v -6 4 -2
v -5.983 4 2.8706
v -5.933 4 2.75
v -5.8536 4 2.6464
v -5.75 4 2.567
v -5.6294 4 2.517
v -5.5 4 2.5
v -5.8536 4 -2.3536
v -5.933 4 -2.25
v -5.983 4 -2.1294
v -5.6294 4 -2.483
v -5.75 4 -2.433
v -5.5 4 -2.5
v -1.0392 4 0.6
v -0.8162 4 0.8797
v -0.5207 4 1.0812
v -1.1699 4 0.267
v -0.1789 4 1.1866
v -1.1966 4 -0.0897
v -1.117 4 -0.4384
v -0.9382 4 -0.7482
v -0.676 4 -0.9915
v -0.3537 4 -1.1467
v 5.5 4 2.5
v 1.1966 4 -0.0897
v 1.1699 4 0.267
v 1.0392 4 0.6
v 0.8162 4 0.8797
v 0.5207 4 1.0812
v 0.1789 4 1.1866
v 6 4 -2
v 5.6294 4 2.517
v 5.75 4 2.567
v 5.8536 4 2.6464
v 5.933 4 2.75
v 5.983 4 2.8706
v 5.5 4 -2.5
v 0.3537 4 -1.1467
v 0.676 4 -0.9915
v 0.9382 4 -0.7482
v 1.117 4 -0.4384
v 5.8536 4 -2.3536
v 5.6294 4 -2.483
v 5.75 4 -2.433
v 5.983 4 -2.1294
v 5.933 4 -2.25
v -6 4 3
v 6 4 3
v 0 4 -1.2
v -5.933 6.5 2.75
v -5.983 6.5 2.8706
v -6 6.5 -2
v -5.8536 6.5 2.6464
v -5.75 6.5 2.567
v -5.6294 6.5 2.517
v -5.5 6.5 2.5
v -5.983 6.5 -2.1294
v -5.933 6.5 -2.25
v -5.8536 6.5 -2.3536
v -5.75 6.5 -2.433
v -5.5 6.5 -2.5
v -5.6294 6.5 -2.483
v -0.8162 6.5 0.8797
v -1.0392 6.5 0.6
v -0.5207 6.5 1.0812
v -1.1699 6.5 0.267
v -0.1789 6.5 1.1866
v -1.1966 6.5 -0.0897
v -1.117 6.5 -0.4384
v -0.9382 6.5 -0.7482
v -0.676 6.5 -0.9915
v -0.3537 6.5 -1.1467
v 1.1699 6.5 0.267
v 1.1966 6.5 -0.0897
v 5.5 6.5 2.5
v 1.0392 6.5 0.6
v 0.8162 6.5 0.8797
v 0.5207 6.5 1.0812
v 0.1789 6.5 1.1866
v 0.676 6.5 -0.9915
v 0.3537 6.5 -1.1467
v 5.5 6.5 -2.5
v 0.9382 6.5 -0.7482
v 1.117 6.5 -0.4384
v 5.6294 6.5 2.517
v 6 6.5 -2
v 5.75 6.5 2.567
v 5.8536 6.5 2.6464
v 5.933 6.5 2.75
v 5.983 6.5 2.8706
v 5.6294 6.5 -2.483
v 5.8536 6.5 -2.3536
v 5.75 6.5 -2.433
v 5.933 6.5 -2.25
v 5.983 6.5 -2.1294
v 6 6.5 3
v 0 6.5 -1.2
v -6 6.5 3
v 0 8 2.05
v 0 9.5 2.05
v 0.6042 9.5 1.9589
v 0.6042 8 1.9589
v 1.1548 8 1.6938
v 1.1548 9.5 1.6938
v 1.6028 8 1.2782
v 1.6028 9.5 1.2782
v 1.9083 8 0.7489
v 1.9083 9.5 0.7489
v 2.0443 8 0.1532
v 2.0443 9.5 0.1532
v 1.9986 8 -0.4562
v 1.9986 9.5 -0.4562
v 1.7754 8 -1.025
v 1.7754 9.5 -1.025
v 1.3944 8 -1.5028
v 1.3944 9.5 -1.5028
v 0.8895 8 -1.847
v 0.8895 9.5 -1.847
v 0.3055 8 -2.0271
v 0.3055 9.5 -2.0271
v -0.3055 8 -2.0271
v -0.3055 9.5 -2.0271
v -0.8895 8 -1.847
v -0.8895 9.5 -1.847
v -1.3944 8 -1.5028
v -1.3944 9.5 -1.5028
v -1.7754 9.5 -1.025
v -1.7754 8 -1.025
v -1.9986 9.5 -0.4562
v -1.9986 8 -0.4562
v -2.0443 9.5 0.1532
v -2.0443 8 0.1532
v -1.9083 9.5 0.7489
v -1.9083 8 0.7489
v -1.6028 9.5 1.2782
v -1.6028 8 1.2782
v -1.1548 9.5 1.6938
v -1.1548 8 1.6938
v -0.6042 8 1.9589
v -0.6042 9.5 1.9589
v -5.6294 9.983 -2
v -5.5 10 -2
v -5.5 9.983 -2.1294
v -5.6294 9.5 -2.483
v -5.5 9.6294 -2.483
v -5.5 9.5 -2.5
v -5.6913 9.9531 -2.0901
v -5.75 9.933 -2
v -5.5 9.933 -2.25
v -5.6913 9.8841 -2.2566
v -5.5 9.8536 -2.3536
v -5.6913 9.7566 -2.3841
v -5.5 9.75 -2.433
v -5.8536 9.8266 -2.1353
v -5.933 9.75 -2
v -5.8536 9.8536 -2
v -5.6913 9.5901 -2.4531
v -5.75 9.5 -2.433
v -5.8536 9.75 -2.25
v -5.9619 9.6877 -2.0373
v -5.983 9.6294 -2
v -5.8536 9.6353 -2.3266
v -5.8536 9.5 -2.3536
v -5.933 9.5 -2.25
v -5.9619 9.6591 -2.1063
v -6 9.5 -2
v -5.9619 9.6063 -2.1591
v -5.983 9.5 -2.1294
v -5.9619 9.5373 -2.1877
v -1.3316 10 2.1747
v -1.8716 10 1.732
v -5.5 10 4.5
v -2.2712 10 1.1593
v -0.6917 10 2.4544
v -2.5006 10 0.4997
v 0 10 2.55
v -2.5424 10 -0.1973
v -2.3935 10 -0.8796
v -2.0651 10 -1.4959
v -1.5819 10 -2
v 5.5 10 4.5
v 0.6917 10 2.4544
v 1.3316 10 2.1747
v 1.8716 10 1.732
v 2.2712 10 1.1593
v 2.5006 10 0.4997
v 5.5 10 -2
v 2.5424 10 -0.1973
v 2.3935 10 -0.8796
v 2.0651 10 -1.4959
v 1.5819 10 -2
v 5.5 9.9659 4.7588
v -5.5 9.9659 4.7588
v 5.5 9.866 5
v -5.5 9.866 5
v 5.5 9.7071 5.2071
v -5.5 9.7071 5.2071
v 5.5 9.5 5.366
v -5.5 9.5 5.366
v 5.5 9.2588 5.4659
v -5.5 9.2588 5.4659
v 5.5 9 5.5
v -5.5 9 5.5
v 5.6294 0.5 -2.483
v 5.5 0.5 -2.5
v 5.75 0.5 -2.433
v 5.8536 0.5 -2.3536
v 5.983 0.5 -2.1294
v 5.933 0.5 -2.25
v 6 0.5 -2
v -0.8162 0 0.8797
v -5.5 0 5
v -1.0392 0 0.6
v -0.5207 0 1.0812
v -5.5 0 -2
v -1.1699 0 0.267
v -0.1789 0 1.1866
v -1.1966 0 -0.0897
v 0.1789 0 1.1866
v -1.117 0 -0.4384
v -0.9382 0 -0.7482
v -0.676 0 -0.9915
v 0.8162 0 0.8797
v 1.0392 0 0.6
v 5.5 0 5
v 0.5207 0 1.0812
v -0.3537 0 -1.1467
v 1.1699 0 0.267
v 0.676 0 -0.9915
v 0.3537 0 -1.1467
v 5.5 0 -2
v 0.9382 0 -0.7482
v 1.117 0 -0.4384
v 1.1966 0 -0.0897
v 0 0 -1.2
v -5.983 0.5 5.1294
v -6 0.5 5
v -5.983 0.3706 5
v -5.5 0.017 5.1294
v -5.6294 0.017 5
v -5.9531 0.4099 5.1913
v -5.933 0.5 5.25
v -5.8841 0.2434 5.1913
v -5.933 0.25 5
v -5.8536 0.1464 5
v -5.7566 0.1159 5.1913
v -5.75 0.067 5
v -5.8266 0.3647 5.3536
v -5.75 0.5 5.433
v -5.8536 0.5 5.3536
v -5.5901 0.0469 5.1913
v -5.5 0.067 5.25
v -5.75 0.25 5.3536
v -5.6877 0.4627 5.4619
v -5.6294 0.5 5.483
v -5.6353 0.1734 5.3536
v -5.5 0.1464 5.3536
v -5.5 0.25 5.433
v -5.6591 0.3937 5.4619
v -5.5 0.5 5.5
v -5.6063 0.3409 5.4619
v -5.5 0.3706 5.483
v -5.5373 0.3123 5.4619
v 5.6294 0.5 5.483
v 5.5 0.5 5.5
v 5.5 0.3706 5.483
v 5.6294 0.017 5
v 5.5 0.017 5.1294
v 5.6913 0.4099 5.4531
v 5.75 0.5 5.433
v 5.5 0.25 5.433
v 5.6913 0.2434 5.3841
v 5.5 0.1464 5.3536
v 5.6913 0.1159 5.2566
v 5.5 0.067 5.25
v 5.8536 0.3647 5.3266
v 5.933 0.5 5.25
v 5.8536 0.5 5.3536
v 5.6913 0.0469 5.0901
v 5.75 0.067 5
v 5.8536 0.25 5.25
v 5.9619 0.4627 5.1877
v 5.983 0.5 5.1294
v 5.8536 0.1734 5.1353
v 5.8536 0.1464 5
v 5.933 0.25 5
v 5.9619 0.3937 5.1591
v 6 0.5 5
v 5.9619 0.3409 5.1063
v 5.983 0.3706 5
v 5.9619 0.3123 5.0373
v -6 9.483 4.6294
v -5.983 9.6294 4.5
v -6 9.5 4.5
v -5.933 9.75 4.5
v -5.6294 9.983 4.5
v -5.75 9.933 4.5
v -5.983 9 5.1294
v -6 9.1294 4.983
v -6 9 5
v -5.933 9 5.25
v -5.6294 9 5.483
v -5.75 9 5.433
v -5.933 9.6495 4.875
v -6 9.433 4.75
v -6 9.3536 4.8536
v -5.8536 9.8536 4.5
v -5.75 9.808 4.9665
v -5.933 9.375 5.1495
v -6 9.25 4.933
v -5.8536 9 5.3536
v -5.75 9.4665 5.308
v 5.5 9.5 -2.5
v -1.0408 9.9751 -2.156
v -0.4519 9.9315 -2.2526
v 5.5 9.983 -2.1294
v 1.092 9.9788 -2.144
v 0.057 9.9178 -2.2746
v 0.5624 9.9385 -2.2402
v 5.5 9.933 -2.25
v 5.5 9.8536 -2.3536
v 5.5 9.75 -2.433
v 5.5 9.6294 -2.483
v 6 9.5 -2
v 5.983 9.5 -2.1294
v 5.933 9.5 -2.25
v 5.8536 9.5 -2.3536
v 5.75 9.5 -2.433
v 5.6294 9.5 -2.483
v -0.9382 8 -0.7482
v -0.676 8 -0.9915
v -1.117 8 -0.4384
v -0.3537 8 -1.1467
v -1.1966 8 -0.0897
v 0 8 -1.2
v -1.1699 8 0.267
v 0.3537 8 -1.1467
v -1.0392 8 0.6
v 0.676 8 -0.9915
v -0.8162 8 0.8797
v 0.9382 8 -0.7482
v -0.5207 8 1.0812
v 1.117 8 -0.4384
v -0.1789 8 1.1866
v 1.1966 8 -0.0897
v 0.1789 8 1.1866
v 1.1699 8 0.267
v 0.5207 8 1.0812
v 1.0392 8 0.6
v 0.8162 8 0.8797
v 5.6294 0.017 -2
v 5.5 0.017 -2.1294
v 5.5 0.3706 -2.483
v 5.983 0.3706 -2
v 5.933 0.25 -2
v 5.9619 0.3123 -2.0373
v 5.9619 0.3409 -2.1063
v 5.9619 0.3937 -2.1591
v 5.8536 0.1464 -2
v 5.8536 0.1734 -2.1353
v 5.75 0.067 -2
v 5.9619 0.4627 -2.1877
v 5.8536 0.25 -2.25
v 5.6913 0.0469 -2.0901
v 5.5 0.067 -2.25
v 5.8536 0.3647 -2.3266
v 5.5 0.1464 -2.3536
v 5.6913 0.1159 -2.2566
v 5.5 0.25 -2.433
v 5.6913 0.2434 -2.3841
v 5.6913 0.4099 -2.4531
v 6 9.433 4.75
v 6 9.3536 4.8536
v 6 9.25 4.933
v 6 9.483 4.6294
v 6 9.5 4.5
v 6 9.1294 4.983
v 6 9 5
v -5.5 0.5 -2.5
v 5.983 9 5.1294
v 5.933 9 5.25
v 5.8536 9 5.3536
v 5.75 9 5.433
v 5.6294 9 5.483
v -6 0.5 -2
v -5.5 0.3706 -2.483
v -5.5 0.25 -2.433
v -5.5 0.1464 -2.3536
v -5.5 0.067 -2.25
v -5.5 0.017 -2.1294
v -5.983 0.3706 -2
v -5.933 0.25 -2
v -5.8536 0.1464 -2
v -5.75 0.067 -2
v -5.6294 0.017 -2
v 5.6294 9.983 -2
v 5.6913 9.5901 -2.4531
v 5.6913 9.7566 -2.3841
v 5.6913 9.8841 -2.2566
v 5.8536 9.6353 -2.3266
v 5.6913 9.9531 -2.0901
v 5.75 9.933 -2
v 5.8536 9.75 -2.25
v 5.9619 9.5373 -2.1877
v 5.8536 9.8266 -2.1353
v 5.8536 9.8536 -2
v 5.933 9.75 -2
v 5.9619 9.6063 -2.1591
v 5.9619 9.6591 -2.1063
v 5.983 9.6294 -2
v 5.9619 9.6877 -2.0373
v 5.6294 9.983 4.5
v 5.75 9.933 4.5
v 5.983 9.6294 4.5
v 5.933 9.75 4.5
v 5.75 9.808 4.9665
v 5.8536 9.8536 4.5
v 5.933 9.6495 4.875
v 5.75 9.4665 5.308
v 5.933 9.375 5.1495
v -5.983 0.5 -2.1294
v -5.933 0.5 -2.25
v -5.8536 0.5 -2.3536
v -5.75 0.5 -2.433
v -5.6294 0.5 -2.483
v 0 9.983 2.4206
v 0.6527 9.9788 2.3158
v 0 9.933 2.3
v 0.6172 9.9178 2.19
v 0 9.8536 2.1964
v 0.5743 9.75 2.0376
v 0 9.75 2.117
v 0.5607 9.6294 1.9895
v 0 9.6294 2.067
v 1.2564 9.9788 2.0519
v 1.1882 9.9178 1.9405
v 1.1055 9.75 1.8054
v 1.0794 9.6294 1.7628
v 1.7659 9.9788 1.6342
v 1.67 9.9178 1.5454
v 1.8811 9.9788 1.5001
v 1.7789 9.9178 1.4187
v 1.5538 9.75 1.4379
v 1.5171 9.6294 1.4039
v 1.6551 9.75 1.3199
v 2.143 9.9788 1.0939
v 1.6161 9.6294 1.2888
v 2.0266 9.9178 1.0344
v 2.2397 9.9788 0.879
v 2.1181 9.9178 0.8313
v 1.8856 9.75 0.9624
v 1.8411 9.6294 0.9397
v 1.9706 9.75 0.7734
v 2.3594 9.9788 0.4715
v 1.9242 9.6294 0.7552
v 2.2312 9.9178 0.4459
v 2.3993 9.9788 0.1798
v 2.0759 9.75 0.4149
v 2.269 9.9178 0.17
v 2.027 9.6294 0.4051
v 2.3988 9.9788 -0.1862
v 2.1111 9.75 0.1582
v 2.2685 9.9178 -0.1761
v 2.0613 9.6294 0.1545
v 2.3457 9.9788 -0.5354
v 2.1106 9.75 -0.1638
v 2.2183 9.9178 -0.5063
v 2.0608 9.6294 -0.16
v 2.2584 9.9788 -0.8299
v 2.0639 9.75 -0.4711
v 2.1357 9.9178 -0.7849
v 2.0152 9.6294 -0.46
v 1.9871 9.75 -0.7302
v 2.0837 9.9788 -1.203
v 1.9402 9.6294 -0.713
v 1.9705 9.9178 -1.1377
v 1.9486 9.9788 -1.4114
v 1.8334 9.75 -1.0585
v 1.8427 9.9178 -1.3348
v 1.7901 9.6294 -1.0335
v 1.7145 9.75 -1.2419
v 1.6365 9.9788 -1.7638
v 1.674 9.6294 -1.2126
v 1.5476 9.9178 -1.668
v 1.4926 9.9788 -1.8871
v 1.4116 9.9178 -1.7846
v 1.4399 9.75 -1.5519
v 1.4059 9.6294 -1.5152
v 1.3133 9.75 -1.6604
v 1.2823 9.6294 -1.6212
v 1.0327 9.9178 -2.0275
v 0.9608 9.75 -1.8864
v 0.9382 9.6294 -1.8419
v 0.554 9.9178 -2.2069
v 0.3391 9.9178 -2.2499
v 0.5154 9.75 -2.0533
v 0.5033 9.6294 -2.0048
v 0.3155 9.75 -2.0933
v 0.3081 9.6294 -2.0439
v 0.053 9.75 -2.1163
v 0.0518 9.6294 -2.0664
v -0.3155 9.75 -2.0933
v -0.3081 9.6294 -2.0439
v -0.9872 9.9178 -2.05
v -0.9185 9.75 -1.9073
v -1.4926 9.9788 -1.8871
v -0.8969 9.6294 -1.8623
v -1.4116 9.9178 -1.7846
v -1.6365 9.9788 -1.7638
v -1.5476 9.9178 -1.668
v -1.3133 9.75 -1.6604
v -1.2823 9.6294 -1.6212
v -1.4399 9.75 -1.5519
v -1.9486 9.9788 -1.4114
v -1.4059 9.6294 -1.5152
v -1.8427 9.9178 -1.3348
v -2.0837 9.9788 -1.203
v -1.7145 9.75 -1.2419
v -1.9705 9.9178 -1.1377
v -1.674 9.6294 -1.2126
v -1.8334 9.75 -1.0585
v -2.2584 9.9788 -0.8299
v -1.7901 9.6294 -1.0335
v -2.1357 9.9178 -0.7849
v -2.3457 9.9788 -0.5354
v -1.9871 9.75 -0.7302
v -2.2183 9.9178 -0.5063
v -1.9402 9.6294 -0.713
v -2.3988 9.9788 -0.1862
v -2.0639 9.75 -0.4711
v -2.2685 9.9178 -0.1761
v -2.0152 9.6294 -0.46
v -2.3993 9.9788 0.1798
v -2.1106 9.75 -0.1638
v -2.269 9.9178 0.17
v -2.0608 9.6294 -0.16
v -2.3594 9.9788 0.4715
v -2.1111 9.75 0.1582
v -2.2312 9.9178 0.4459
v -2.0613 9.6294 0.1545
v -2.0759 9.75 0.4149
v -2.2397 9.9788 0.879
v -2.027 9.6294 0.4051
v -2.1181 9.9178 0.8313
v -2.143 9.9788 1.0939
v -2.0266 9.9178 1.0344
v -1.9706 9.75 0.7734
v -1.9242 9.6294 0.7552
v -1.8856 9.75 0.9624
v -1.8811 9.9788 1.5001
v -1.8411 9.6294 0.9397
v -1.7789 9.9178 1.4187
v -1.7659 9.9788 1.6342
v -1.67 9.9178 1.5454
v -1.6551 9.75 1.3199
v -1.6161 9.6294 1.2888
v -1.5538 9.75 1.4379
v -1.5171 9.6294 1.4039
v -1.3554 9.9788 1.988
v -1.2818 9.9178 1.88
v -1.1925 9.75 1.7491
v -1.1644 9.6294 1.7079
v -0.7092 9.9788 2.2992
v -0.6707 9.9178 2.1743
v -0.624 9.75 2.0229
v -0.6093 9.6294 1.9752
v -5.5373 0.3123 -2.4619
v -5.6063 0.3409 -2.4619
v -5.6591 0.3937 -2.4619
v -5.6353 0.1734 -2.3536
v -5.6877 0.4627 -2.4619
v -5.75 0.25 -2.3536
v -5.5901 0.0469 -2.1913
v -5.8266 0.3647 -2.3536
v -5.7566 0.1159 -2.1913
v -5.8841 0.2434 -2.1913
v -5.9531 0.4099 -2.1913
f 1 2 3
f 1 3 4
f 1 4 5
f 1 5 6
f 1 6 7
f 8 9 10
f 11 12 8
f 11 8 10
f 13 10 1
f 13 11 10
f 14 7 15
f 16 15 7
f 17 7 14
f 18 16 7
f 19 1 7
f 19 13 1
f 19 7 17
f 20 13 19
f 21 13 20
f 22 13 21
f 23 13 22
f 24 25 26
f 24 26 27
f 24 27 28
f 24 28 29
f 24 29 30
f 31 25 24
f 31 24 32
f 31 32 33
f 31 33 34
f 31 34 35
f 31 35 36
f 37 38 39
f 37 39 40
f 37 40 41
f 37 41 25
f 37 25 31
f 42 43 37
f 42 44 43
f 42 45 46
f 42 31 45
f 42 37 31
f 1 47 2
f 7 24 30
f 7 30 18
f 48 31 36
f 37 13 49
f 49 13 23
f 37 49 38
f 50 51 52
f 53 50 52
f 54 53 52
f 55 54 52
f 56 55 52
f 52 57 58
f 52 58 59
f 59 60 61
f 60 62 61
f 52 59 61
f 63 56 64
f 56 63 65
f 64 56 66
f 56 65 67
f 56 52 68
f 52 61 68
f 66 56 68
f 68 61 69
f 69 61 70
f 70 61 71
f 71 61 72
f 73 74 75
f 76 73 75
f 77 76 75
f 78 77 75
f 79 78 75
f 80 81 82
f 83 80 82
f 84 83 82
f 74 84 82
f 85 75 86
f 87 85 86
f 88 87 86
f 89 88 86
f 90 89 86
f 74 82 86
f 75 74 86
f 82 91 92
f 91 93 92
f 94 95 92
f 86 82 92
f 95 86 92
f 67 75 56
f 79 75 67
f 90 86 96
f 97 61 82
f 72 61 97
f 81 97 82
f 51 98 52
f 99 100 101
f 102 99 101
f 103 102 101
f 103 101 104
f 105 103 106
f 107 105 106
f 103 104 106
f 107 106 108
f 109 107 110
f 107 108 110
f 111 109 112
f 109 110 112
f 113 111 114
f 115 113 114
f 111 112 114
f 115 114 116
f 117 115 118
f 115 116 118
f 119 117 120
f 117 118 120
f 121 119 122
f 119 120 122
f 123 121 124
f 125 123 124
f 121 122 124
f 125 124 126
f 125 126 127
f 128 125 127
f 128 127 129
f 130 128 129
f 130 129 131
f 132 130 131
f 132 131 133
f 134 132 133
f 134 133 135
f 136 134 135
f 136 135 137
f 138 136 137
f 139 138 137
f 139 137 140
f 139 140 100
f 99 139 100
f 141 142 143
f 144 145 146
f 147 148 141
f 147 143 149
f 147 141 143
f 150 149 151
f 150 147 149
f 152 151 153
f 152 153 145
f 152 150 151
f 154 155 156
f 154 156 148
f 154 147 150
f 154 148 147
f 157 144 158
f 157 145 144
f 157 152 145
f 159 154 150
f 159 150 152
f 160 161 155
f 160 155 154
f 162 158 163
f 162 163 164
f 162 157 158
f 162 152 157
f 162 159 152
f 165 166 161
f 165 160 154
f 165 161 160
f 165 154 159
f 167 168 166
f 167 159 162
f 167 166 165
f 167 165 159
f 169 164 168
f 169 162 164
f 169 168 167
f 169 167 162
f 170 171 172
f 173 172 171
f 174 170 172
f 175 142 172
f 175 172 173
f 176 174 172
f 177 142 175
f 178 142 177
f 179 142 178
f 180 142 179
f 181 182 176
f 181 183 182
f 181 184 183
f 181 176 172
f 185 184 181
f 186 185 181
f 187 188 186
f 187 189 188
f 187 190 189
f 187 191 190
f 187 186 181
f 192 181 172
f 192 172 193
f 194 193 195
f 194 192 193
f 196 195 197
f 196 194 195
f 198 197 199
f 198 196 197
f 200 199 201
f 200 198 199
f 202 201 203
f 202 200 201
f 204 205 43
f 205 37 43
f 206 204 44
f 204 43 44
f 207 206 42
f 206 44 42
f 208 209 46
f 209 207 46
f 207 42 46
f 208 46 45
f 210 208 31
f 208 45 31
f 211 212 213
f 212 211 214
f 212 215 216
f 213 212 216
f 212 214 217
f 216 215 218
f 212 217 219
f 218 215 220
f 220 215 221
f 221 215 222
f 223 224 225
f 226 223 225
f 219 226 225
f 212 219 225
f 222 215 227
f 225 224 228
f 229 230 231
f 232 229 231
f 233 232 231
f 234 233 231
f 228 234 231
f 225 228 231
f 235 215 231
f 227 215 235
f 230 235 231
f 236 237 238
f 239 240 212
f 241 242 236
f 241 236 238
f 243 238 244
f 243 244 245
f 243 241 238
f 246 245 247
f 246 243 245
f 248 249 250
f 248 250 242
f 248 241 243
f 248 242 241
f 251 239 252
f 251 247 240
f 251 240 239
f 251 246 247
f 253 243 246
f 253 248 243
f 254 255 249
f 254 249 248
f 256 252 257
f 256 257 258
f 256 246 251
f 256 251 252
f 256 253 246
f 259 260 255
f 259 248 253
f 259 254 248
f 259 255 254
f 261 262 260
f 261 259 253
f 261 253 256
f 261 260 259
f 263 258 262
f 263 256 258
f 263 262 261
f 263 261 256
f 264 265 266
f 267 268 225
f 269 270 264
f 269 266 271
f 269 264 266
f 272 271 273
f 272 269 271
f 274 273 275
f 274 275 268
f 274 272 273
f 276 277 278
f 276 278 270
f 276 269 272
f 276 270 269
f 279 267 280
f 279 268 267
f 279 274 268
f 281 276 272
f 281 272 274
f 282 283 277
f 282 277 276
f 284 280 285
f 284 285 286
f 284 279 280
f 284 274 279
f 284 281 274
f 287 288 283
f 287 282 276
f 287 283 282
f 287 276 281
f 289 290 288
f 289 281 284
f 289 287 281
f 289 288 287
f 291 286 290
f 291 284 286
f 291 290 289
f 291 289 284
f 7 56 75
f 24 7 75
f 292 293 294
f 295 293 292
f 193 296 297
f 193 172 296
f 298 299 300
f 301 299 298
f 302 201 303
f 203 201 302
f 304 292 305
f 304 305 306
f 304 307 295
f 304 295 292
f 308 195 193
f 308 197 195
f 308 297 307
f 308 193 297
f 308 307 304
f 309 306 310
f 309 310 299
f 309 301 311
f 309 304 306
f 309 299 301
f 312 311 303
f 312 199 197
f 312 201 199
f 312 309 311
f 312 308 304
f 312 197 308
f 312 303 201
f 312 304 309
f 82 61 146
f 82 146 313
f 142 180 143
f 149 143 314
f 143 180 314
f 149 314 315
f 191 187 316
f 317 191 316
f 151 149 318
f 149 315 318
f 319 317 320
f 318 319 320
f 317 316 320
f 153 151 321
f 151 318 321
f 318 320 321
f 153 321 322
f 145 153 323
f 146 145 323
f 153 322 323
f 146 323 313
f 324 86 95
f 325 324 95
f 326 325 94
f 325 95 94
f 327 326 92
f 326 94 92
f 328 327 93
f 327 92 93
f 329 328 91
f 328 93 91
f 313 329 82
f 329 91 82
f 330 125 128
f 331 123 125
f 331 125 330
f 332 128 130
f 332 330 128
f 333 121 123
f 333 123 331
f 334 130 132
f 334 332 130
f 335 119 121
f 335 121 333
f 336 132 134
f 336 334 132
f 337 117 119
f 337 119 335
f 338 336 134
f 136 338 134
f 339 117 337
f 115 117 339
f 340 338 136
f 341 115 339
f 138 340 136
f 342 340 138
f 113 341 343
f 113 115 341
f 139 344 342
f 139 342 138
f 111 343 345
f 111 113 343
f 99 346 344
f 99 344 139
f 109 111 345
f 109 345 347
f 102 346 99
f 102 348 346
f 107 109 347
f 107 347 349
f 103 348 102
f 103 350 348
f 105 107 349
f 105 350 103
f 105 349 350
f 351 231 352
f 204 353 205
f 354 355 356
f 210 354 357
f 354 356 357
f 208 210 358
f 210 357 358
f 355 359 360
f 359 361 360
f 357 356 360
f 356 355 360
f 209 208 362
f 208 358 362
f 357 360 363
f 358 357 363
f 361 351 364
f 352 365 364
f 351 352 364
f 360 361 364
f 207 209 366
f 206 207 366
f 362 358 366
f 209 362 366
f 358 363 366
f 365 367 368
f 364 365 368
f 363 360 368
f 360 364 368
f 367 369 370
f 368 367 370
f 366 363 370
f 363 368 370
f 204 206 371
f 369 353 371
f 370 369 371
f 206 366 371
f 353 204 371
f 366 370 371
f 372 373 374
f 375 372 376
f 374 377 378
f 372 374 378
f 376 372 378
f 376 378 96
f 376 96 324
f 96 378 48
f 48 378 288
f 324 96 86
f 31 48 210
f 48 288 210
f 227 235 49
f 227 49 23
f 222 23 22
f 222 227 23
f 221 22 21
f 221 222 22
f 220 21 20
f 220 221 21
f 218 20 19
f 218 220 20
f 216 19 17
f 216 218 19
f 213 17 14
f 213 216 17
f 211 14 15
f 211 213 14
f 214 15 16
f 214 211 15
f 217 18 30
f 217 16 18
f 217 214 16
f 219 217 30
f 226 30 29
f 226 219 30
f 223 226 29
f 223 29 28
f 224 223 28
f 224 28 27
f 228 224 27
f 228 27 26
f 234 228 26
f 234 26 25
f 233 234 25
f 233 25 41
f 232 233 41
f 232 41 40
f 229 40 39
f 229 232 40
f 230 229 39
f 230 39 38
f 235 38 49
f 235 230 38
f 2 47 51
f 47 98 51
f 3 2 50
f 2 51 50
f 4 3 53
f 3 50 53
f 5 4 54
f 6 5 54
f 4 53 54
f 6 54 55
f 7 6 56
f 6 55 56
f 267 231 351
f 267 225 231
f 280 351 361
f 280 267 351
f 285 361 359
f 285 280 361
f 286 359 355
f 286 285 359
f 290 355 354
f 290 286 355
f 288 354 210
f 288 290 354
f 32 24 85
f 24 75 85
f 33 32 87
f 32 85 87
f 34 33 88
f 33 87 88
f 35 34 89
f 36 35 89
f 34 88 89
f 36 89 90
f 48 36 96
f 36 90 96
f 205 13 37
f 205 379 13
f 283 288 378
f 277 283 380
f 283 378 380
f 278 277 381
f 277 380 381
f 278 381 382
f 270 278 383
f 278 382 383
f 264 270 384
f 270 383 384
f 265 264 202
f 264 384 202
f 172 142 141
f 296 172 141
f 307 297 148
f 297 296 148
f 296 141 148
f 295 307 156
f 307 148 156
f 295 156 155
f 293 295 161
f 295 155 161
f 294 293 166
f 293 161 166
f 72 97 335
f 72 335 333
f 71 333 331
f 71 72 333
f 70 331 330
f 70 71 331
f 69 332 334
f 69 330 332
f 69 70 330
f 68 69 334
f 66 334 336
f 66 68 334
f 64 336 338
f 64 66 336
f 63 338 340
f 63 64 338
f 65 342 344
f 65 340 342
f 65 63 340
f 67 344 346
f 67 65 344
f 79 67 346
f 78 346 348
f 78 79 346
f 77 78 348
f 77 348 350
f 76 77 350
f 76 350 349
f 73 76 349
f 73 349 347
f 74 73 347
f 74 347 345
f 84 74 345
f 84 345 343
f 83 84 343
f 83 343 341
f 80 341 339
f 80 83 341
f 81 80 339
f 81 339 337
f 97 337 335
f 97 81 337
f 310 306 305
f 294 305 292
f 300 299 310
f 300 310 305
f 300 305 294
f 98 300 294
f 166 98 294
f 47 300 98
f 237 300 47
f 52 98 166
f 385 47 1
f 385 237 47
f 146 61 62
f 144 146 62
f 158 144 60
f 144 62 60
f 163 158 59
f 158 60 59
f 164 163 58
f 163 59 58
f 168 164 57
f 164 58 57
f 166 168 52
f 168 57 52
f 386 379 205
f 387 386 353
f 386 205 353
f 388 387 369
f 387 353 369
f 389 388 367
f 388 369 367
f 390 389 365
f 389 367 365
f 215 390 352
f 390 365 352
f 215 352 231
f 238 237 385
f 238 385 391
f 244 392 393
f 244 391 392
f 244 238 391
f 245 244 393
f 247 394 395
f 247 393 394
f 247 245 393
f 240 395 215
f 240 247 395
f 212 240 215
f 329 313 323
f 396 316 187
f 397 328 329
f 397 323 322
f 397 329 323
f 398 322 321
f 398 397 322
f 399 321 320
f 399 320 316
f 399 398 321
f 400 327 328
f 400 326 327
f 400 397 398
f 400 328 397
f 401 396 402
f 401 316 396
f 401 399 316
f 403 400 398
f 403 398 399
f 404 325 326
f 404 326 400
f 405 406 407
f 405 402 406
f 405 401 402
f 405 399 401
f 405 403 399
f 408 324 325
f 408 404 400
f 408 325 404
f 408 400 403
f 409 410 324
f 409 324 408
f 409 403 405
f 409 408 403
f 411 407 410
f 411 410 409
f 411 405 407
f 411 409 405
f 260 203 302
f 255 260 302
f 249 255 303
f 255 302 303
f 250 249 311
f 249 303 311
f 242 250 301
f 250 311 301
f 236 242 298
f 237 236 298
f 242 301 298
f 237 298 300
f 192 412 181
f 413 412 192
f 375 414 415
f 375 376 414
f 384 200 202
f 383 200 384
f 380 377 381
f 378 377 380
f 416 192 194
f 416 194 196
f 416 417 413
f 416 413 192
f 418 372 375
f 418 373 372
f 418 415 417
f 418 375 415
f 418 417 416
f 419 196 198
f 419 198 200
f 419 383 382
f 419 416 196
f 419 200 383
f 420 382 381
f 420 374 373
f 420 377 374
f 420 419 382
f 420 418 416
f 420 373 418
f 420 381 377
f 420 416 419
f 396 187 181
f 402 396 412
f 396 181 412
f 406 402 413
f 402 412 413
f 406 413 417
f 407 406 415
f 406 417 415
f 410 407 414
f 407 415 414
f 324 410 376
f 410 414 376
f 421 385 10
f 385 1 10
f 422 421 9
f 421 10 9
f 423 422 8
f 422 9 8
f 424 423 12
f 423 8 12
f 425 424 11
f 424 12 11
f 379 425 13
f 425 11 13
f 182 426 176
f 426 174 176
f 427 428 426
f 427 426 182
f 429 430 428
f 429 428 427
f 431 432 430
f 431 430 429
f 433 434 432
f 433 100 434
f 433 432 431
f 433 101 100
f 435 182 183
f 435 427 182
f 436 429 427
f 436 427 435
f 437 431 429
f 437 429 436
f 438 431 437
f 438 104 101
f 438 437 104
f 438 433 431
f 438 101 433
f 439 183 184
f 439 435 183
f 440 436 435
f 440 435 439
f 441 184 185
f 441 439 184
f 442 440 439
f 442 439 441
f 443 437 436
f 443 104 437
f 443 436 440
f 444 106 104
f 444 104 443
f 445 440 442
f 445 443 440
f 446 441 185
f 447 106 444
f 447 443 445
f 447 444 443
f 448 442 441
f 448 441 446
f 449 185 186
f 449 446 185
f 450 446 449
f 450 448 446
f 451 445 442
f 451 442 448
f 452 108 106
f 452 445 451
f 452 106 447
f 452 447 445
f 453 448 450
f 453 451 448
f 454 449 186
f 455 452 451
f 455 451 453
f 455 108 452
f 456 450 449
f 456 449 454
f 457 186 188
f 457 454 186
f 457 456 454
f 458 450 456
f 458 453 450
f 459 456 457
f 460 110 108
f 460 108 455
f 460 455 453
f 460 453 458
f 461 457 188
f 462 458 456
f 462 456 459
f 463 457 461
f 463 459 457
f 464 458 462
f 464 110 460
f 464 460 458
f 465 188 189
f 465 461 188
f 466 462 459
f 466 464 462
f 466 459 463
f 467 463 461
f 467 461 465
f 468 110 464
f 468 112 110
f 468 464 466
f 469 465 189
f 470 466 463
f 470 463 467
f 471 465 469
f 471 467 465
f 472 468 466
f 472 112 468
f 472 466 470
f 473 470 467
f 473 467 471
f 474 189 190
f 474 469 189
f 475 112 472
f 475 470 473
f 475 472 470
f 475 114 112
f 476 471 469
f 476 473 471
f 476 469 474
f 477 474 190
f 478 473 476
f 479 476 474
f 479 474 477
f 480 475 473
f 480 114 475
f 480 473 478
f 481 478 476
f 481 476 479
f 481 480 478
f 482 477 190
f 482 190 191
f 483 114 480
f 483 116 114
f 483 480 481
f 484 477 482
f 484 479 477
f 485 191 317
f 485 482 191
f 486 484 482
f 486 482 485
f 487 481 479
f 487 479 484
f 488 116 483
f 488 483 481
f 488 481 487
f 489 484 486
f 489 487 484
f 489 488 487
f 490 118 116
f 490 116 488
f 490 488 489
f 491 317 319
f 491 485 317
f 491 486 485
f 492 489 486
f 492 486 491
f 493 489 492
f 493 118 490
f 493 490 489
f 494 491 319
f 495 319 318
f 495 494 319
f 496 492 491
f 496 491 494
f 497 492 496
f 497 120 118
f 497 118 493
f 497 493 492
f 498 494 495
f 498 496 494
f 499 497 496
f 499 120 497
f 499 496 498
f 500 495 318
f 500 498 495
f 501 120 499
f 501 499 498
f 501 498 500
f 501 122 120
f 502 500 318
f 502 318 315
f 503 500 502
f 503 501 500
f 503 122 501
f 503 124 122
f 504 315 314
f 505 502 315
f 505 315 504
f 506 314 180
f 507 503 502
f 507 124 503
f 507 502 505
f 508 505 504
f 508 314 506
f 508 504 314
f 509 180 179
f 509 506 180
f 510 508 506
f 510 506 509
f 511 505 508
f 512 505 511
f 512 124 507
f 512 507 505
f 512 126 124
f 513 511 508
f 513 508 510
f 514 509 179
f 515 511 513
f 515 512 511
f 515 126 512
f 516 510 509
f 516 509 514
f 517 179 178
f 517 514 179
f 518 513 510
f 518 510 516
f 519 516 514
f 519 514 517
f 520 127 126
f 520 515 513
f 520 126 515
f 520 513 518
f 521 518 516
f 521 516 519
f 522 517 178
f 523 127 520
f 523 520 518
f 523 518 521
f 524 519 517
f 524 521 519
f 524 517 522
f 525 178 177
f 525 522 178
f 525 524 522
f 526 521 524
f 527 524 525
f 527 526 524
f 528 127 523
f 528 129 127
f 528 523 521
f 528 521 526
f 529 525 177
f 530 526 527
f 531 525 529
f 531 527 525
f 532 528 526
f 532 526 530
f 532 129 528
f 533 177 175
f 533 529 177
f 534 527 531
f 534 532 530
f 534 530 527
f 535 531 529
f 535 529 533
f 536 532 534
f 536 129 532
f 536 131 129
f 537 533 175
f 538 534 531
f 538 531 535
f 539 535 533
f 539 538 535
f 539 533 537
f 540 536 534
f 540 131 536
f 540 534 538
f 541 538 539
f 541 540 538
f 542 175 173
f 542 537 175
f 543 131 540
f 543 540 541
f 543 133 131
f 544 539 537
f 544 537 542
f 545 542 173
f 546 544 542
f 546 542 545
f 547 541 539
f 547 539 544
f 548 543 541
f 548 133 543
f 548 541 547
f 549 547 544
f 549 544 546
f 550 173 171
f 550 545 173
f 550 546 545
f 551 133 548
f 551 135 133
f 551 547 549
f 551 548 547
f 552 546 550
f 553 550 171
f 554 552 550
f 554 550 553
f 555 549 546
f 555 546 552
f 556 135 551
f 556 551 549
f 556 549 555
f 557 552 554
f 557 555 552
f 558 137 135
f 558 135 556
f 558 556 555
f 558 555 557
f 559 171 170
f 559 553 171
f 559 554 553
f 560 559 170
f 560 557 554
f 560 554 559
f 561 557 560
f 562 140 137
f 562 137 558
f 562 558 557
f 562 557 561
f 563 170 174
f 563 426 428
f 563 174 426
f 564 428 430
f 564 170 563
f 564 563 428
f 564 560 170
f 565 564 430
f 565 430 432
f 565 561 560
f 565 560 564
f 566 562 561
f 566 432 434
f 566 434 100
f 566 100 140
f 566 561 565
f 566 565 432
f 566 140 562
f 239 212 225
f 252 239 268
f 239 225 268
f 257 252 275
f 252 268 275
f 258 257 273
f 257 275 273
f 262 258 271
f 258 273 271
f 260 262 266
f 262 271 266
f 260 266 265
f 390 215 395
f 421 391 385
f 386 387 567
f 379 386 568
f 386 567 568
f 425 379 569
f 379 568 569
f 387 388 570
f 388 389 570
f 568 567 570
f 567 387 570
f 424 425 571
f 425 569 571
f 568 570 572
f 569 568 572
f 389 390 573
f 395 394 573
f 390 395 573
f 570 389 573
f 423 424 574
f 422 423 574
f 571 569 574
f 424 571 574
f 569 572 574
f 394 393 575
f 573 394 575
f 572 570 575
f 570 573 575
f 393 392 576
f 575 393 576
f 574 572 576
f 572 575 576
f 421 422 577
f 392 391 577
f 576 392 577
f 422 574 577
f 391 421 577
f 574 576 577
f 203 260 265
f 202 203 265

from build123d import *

# Parameters (mm, degrees)
SKETCH1_W               = 12
SKETCH1_H               = 5
BOSS_EXTRUDE1_DEPTH     = 4
SKETCH2_W               = 12
SKETCH2_H               = 6.5
BOSS_EXTRUDE2_DEPTH     = 3
SKETCH3_W               = 12
SKETCH3_H               = 8
BOSS_EXTRUDE3_DEPTH     = 3.5
CUT_EXTRUDE1_DEPTH      = 7
CUT_EXTRUDE1_DEPTH_BACK = 5
SKETCH4_R               = 1.2
SKETCH5_R               = 2.05
CUT_EXTRUDE2_DEPTH      = 2
FILLET3_R               = 0.5
FILLET6_R               = 1
FILLET7_R               = 0.5


with BuildPart() as part:
    # Sketch1 → Boss-Extrude1 (new body)
    with BuildSketch(Plane(origin=(0, 0, 0), x_dir=(1, 0, 0), z_dir=(0, 1, 0))):
        Rectangle(SKETCH1_W, SKETCH1_H)
    extrude(amount=BOSS_EXTRUDE1_DEPTH)

    # Sketch2 → Boss-Extrude2 (add)
    with BuildSketch(Plane.XY.offset(2.5)):
        with Locations((0, 3.25)):
            Rectangle(SKETCH2_W, SKETCH2_H)
    extrude(amount=BOSS_EXTRUDE2_DEPTH)

    # Sketch3 → Boss-Extrude3 (add)
    with BuildSketch(Plane(origin=(0, 6.5, 0), x_dir=(1, 0, 0), z_dir=(0, 1, 0))):
        with Locations((0, -1.5)):
            Rectangle(SKETCH3_W, SKETCH3_H)
    extrude(amount=BOSS_EXTRUDE3_DEPTH)

    # Sketch4 → Cut-Extrude1 (cut, two sides: drawn at the far end of the back side and taken through both)
    with BuildSketch(Plane(origin=(0, 4, 0), x_dir=(1, 0, 0), z_dir=(0, 1, 0)).offset(-CUT_EXTRUDE1_DEPTH_BACK)):
        with Locations(Location((0, 0, 0), (0, 0, 90))):
            Circle(SKETCH4_R)
    extrude(amount=CUT_EXTRUDE1_DEPTH + CUT_EXTRUDE1_DEPTH_BACK, mode=Mode.SUBTRACT)

    # Sketch5 → Cut-Extrude2 (cut)
    with BuildSketch(Plane(origin=(0, 10, 0), x_dir=(1, 0, 0), z_dir=(0, 1, 0))):
        with Locations(Location((0, 0, 0), (0, 0, 270))):
            Circle(SKETCH5_R)
    extrude(amount=-CUT_EXTRUDE2_DEPTH, mode=Mode.SUBTRACT)

    # Fillet3
    fillet3_edges = [part.edges().sort_by_distance(p)[0] for p in [
        (-6, 5.25, 2.5),
        (6, 5.25, 2.5),
        (0, 0, 5.5),
        (-6, 0, 1.5),
        (0, 0, -2.5),
        (6, 0, 1.5),
        (-6, 2, -2.5),
        (6, 2, -2.5),
    ]]
    fillet(fillet3_edges, radius=FILLET3_R)

    # Fillet6
    fillet6_edges = [part.edges().sort_by_distance(p)[0] for p in [
        (0, 10, 5.5),
    ]]
    fillet(fillet6_edges, radius=FILLET6_R)

    # Fillet7
    # the kernel refuses this fillet: 0.5 mm, written as the material it takes off along each edge
    with BuildSketch(Plane(origin=(5.5, 0.5, 5), x_dir=(0, 0, 1), z_dir=(1, 0, 0))) as fillet7_piece_1_section:
        Polygon((0, 0), (FILLET7_R, 0), (FILLET7_R, FILLET7_R), (0, FILLET7_R), align=None)
    fillet7_piece_1 = extrude(amount=FILLET7_R, mode=Mode.PRIVATE)
    fillet7_piece_1 = fillet7_piece_1 - Plane(origin=(5.5, 0.5, 5), x_dir=(0, 0.7071067811865475, -0.7071067811865475), z_dir=(1, 0, 0)) * Sphere(FILLET7_R, mode=Mode.PRIVATE)
    add(fillet7_piece_1, mode=Mode.SUBTRACT)
    with BuildSketch(Plane(origin=(-5.5, 0.5, 5), x_dir=(-1, 0, 0), z_dir=(0, 0, 1))) as fillet7_piece_2_section:
        Polygon((0, 0), (FILLET7_R, 0), (FILLET7_R, FILLET7_R), (0, FILLET7_R), align=None)
    fillet7_piece_2 = extrude(amount=FILLET7_R, mode=Mode.PRIVATE)
    fillet7_piece_2 = fillet7_piece_2 - Plane(origin=(-5.5, 0.5, 5), x_dir=(0.7071067811865475, 0.7071067811865475, 0), z_dir=(0, 0, 1)) * Sphere(FILLET7_R, mode=Mode.PRIVATE)
    add(fillet7_piece_2, mode=Mode.SUBTRACT)
    with BuildSketch(Plane(origin=(5.5, 9.5, -2), x_dir=(0, 1, 0), z_dir=(1, 0, 0))) as fillet7_piece_3_section:
        Polygon((0, 0), (FILLET7_R, 0), (FILLET7_R, -FILLET7_R), (0, -FILLET7_R), align=None)
    fillet7_piece_3 = extrude(amount=FILLET7_R, mode=Mode.PRIVATE)
    fillet7_piece_3 = fillet7_piece_3 - Plane(origin=(5.5, 9.5, -2), x_dir=(0, -0.7071067811865475, 0.7071067811865475), z_dir=(1, 0, 0)) * Sphere(FILLET7_R, mode=Mode.PRIVATE)
    add(fillet7_piece_3, mode=Mode.SUBTRACT)
    with BuildSketch(Plane(origin=(-5.5, 9.5, -2), x_dir=(0, 1, 0), z_dir=(-1, 0, 0))) as fillet7_piece_4_section:
        Polygon((0, 0), (FILLET7_R, 0), (FILLET7_R, FILLET7_R), (0, FILLET7_R), align=None)
    fillet7_piece_4 = extrude(amount=FILLET7_R, mode=Mode.PRIVATE)
    fillet7_piece_4 = fillet7_piece_4 - Plane(origin=(-5.5, 9.5, -2), x_dir=(0, -0.7071067811865475, 0.7071067811865475), z_dir=(-1, 0, 0)) * Sphere(FILLET7_R, mode=Mode.PRIVATE)
    add(fillet7_piece_4, mode=Mode.SUBTRACT)
    with BuildSketch(Plane(origin=(6, 10, 4.5), x_dir=(0, -1, 0), z_dir=(0, 0, -1))) as fillet7_piece_5:
        with BuildLine():
            CenterArc((FILLET7_R, FILLET7_R), FILLET7_R, 180, 90)
            Line((0, FILLET7_R), (0, 0))
            Line((0, 0), (FILLET7_R, 0))
        make_face()
    extrude(amount=6.5, mode=Mode.SUBTRACT)
    with BuildSketch(Plane(origin=(6, 9, 4.5), x_dir=(0, 1, 0), z_dir=(0, 0, -1))) as fillet7_piece_6:
        with BuildLine():
            CenterArc((1 - FILLET7_R, -FILLET7_R), FILLET7_R, 0, 90)
            Line((1, -FILLET7_R), (1, 0))
            Line((1, 0), (1 - FILLET7_R, 0))
        make_face()
    revolve(axis=Axis((6, 9, 4.5), (1, 0, 0)), revolution_arc=90, mode=Mode.SUBTRACT)
    with BuildSketch(Plane(origin=(-6, 9, 5.5), x_dir=(1, 0, 0), z_dir=(0, -1, 0)), Plane(origin=(6, 9, 5.5), x_dir=(0, 0, -1), z_dir=(0, -1, 0))) as fillet7_piece_7:
        with BuildLine():
            CenterArc((FILLET7_R, -FILLET7_R), FILLET7_R, 90, 90)
            Line((0, -FILLET7_R), (0, 0))
            Line((0, 0), (FILLET7_R, 0))
        make_face()
    extrude(amount=8.5, mode=Mode.SUBTRACT)
    with BuildSketch(Plane(origin=(-6, 9, 4.5), x_dir=(0, 1, 0), z_dir=(0, 0, -1))) as fillet7_piece_8:
        with BuildLine():
            CenterArc((1 - FILLET7_R, FILLET7_R), FILLET7_R, 270, 90)
            Line((1 - FILLET7_R, 0), (1, 0))
            Line((1, 0), (1, FILLET7_R))
        make_face()
    revolve(axis=Axis((-6, 9, 4.5), (1, 0, 0)), revolution_arc=90, mode=Mode.SUBTRACT)
    with BuildSketch(Plane(origin=(-6, 5.25, -2.5), x_dir=(1, 0, 0), z_dir=(0, 1, 0)), Plane(origin=(6, 5.25, -2.5), x_dir=(0, 0, 1), z_dir=(0, 1, 0))) as fillet7_piece_9:
        with BuildLine():
            CenterArc((FILLET7_R, -FILLET7_R), FILLET7_R, 90, 90)
            Line((0, -FILLET7_R), (0, 0))
            Line((0, 0), (FILLET7_R, 0))
        make_face()
    extrude(amount=4.25, mode=Mode.SUBTRACT)
    with BuildSketch(Plane(origin=(-6, 10, -2), x_dir=(1, 0, 0), z_dir=(0, 0, 1))) as fillet7_piece_10:
        with BuildLine():
            CenterArc((FILLET7_R, -FILLET7_R), FILLET7_R, 90, 90)
            Line((0, -FILLET7_R), (0, 0))
            Line((0, 0), (FILLET7_R, 0))
        make_face()
    extrude(amount=6.5, mode=Mode.SUBTRACT)
    with BuildSketch(Plane(origin=(5.5, 10, -2.5), x_dir=(0, 0, 1), z_dir=(-1, 0, 0))) as fillet7_piece_11:
        with BuildLine():
            CenterArc((FILLET7_R, -FILLET7_R), FILLET7_R, 90, 90)
            Line((0, -FILLET7_R), (0, 0))
            Line((0, 0), (FILLET7_R, 0))
        make_face()
    extrude(amount=11, mode=Mode.SUBTRACT)
    with BuildSketch(Plane(origin=(0, 10, 0), x_dir=(0, 0, 1), z_dir=(-1, 0, 0))) as fillet7_piece_12:
        with BuildLine():
            CenterArc((2.05 + FILLET7_R, -FILLET7_R), FILLET7_R, 90, 90)
            Line((2.05, -FILLET7_R), (2.05, 0))
            Line((2.05, 0), (2.05 + FILLET7_R, 0))
        make_face()
    revolve(axis=Axis((0, 10, 0), (0, 1, 0)), mode=Mode.SUBTRACT)


solid = part.part
